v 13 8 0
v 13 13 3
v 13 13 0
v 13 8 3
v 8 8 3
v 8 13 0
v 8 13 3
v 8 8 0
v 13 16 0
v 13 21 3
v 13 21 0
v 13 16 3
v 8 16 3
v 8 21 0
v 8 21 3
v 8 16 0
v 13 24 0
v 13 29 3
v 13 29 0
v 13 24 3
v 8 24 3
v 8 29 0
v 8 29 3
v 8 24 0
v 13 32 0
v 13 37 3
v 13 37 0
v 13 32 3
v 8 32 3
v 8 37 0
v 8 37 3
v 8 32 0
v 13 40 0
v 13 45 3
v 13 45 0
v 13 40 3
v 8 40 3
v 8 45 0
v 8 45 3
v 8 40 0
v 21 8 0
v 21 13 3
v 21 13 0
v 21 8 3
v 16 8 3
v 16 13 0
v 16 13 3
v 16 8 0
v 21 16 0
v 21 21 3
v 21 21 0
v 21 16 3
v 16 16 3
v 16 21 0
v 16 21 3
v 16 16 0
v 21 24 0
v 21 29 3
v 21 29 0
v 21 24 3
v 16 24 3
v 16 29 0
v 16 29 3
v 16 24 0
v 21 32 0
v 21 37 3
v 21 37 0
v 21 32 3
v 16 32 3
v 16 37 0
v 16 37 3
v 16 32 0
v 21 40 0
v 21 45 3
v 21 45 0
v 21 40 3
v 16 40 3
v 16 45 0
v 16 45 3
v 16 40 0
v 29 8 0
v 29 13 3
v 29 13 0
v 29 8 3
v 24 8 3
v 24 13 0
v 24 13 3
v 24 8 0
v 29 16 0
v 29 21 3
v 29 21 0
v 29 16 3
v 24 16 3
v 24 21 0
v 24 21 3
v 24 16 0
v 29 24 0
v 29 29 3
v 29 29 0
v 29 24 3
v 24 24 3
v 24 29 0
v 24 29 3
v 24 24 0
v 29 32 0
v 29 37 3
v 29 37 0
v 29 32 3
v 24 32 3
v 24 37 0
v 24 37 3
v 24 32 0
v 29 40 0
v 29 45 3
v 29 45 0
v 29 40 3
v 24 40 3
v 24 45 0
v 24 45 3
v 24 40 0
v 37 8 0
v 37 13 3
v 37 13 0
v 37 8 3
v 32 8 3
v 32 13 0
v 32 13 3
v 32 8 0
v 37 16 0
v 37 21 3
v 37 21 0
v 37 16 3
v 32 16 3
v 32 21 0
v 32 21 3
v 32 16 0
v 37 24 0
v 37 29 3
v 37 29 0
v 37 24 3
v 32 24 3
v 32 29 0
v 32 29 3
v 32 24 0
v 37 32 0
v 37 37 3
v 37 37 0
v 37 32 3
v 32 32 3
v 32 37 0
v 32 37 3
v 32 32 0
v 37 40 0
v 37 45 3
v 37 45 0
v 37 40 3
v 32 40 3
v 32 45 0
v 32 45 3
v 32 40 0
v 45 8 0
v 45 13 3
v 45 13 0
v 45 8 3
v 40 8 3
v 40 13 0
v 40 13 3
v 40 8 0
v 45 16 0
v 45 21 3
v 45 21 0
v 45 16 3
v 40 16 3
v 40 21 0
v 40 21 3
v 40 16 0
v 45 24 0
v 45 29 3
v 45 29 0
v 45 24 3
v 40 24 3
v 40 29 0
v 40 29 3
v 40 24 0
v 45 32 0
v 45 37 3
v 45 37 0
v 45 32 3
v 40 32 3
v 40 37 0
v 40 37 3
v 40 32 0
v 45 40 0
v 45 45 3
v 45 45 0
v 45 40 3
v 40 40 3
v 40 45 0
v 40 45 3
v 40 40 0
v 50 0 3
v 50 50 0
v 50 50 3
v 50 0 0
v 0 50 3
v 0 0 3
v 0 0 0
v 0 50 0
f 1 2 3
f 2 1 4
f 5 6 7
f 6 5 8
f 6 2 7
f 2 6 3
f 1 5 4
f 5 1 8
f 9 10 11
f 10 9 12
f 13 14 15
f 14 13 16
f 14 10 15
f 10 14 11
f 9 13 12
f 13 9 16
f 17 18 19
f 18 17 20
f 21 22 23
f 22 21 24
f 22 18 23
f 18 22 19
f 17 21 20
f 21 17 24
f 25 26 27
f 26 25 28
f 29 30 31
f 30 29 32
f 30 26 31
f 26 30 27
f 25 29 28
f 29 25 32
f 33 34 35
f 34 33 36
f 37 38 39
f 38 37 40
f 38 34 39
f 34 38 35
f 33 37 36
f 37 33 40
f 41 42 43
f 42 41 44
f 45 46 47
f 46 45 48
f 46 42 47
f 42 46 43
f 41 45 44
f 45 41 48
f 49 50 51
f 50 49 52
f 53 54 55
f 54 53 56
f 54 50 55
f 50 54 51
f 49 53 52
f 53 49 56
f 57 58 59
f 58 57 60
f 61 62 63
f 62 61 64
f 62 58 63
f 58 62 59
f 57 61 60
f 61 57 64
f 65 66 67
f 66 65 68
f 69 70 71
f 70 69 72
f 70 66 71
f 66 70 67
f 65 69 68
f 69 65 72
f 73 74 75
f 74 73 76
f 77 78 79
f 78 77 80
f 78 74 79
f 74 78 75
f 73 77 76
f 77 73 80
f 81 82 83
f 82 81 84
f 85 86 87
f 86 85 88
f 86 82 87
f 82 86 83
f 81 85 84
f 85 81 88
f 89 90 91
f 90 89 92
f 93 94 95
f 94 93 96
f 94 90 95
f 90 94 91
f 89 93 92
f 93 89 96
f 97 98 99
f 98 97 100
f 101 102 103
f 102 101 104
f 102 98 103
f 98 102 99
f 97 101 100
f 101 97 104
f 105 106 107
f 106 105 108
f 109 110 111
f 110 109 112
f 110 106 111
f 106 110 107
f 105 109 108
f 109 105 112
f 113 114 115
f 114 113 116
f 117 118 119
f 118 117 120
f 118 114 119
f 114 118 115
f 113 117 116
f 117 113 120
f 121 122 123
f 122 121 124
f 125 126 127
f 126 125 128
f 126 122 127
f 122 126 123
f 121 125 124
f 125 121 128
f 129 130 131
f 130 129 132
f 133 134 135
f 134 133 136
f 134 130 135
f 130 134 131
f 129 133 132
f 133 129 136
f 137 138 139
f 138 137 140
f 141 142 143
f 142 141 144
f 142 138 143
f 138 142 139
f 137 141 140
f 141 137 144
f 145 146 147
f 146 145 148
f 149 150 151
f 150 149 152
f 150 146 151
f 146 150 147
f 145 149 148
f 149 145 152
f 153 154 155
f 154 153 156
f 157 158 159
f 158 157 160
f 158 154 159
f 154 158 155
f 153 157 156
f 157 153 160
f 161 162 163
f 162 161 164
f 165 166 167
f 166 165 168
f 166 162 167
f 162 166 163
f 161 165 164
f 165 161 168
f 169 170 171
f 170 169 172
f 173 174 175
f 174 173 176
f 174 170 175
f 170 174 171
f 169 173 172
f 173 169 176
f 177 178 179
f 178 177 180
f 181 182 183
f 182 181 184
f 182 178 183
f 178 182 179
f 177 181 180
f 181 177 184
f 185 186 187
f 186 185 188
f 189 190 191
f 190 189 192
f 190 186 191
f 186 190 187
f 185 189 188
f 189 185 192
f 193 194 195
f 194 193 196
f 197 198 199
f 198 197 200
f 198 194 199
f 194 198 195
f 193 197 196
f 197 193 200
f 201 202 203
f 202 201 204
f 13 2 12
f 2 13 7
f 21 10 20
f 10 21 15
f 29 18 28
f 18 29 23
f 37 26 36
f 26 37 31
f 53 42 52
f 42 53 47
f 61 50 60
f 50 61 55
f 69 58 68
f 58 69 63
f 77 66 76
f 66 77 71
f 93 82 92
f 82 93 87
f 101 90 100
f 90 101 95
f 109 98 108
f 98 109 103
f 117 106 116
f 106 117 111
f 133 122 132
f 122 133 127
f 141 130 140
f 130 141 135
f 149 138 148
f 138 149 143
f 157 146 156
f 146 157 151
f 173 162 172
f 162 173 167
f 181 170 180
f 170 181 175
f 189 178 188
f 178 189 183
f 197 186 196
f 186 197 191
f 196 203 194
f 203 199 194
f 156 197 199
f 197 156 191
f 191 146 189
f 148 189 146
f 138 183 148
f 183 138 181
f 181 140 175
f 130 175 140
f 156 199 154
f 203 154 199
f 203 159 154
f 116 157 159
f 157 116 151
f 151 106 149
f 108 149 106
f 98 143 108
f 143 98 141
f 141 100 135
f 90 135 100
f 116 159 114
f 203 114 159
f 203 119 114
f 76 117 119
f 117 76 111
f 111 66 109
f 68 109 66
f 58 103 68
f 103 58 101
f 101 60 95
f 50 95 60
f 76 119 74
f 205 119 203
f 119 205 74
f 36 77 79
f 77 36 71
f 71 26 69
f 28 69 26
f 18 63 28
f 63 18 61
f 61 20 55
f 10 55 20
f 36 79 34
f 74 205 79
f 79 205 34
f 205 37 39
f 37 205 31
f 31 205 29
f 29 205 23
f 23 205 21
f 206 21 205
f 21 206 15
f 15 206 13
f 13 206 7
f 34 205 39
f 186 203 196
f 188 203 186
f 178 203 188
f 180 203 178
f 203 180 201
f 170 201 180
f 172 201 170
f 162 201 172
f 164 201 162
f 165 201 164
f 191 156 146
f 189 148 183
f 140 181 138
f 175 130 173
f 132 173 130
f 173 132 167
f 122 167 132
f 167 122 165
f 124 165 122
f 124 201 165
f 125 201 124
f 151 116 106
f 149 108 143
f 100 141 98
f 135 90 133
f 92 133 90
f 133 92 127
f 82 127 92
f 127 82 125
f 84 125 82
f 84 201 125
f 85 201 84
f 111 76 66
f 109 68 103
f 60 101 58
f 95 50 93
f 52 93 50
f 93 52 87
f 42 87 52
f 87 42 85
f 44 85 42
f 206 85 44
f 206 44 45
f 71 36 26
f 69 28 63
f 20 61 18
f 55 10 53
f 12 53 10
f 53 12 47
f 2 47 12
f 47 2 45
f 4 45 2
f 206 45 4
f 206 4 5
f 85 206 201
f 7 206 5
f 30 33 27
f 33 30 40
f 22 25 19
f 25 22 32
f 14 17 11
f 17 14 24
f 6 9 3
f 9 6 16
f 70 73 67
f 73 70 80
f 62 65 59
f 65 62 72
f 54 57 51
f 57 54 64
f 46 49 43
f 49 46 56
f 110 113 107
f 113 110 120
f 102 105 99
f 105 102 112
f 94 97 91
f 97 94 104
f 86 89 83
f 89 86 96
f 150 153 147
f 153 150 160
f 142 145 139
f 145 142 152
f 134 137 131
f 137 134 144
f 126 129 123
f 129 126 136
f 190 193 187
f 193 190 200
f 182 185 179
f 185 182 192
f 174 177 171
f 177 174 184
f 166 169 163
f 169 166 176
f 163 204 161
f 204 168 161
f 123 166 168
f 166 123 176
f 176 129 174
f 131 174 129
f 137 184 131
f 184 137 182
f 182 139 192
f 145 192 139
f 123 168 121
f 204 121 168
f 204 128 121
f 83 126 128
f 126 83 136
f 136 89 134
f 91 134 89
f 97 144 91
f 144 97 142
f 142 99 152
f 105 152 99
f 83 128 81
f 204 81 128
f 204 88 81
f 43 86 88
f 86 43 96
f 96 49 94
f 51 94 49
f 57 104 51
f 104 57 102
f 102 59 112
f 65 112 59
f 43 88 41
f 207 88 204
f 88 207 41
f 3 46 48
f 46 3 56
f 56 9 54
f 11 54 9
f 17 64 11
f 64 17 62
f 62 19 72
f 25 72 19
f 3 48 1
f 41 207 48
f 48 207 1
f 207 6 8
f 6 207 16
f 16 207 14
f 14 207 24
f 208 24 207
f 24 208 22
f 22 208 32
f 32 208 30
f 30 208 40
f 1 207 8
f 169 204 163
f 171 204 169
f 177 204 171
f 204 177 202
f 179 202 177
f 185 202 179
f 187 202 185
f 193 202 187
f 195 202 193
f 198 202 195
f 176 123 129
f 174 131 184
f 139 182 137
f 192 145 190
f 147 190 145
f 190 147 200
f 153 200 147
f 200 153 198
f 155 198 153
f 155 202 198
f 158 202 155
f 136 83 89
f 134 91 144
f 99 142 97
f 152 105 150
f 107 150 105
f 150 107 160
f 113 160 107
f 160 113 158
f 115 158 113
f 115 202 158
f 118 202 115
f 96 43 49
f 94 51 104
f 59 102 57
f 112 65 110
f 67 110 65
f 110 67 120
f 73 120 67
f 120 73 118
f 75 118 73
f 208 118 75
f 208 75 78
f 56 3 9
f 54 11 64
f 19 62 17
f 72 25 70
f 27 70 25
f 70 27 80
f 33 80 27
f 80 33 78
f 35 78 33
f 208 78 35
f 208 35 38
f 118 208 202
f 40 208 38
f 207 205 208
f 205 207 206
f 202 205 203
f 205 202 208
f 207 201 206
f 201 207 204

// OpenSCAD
// sizes:
w = 50;
h = 50;
d = 3;

// holes:
hw = 5;
hw_gap = 4;
count = w / (hw + hw_gap);

difference(){
    cube([w,h,d]);
    
    for(i = [1 : count]){
        for(j = [1 : count]){
        color ("blue")
        translate([hw_gap * i * 2,hw_gap * j * 2, -1])
        cube(hw);
        }
    }
}
